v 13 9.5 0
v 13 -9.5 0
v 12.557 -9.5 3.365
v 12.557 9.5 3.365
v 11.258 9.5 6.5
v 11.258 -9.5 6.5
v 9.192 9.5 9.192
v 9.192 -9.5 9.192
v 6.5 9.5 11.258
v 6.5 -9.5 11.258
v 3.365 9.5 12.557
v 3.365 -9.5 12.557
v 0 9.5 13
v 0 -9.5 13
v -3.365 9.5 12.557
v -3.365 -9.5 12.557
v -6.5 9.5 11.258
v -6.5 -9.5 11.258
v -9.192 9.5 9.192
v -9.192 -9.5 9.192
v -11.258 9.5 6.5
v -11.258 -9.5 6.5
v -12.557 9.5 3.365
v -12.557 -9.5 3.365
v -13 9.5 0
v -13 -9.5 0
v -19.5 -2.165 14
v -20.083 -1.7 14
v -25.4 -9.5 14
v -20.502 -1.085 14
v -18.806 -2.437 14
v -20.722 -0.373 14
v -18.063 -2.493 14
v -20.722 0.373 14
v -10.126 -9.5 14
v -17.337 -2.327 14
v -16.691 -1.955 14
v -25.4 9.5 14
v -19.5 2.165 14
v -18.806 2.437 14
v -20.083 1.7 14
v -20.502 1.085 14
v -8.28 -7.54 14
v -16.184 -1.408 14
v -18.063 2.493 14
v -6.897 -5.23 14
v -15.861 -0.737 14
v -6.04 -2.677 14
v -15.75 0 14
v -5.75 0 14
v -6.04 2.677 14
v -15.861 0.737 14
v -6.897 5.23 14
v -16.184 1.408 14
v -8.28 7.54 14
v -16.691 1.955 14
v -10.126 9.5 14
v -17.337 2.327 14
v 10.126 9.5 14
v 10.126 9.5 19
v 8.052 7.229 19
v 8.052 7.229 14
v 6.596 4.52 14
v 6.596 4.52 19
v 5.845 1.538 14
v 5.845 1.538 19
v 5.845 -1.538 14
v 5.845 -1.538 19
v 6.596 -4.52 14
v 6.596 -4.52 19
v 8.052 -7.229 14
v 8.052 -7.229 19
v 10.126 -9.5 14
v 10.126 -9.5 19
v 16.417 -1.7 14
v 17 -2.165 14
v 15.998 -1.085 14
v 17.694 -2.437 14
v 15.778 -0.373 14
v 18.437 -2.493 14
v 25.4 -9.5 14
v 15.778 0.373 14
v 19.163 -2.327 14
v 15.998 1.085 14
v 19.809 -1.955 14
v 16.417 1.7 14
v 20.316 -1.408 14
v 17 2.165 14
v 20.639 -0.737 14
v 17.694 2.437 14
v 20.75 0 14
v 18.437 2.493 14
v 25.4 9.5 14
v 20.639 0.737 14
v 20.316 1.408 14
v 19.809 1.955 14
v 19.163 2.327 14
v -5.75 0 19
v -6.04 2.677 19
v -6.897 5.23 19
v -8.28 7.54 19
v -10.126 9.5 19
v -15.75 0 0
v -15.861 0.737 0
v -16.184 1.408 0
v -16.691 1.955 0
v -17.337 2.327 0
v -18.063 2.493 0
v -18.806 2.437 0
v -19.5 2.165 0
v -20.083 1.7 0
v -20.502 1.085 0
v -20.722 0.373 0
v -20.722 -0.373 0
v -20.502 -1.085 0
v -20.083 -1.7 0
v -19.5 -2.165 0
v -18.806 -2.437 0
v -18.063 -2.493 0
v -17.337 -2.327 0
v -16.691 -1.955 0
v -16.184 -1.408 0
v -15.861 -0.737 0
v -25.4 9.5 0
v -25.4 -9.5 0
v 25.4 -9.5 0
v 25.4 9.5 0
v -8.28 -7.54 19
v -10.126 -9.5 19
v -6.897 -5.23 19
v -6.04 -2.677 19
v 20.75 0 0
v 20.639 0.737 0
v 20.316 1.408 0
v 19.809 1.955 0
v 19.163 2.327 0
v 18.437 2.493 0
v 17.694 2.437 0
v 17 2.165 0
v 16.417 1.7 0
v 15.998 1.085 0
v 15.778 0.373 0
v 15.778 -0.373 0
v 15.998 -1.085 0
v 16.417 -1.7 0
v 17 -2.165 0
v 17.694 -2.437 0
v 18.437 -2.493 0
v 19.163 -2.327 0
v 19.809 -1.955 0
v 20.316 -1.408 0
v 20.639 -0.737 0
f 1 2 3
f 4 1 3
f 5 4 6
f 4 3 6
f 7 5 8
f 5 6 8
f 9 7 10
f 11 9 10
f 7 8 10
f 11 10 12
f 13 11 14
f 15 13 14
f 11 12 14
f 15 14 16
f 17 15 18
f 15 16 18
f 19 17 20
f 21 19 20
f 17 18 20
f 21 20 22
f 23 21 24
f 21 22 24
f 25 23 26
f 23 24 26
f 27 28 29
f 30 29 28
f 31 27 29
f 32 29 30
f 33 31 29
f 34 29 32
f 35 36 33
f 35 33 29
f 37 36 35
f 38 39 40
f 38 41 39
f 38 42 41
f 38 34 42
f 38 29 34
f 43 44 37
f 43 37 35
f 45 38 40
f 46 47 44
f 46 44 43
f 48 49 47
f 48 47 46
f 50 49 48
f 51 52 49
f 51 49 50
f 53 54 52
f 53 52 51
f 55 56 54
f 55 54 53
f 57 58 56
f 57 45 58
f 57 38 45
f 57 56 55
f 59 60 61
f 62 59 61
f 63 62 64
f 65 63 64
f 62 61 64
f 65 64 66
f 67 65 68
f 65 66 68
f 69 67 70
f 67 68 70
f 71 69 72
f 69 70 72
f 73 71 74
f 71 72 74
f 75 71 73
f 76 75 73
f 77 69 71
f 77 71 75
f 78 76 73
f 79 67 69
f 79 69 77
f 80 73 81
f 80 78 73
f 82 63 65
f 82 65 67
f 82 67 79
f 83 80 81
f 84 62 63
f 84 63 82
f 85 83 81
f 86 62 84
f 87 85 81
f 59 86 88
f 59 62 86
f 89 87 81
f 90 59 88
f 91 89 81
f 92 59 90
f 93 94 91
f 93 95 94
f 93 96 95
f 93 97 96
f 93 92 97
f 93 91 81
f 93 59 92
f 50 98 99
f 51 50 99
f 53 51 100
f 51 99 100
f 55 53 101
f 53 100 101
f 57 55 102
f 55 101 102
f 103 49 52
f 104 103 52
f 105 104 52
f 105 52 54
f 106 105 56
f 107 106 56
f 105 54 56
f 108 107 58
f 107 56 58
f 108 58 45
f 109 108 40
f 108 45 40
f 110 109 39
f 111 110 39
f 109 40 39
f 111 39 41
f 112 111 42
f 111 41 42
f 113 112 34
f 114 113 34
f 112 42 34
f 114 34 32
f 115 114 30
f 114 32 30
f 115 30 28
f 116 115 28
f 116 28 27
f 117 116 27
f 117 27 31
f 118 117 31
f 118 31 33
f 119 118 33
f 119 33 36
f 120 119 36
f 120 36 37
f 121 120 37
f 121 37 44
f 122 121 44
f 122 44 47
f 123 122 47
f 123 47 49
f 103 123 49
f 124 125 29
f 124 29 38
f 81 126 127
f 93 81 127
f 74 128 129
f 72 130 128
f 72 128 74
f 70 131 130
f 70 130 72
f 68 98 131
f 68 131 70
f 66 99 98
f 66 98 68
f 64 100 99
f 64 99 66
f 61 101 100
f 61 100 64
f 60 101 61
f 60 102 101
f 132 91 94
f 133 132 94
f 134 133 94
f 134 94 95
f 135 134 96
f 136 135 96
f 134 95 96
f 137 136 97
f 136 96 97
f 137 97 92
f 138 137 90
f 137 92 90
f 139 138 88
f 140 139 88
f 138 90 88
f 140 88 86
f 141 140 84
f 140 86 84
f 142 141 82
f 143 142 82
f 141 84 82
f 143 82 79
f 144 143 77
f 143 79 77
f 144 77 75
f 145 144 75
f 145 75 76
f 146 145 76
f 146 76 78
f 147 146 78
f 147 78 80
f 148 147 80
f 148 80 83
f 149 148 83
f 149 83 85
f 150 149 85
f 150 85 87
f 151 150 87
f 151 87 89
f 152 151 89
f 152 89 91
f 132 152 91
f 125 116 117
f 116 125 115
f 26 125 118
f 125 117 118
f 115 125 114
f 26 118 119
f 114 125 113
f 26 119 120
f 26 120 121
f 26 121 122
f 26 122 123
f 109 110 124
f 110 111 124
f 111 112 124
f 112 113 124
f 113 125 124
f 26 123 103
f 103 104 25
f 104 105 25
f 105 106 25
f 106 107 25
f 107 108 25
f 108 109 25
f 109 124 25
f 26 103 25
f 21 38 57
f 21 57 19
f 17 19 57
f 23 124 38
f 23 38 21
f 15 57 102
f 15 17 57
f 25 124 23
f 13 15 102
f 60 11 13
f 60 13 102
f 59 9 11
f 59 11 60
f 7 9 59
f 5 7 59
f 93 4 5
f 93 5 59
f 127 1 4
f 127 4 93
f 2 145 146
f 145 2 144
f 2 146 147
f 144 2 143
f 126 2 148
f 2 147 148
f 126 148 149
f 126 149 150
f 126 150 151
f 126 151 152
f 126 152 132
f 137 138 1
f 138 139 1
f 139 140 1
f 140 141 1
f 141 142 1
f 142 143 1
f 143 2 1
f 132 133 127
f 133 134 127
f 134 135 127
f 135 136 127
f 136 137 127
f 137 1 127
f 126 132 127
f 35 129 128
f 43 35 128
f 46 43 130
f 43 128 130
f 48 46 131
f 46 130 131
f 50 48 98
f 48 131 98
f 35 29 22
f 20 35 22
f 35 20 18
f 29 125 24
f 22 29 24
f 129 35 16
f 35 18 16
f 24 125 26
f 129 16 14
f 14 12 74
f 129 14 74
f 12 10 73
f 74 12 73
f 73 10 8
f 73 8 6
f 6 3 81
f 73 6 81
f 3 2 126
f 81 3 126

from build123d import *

# Parameters (mm, degrees)
SKETCH2_W               = 50.8
SKETCH2_H               = 19
BOSS_EXTRUDE1_DEPTH     = 19
SKETCH3_R               = 13
CUT_EXTRUDE1_DEPTH      = 20
SKETCH4_R               = 2.5
CUT_EXTRUDE2_DEPTH      = 5
SKETCH5_R               = 2.5
CUT_EXTRUDE3_DEPTH      = 1
CUT_EXTRUDE3_DEPTH_BACK = 20


with BuildPart() as part:
    # Sketch2 → Boss-Extrude1 (new body)
    with BuildSketch(Plane.XY):
        Rectangle(SKETCH2_W, SKETCH2_H)
    extrude(amount=BOSS_EXTRUDE1_DEPTH)

    # Sketch3 → Cut-Extrude1 (cut, through all)
    with BuildSketch(Plane.XZ.offset(9.5)):
        Circle(SKETCH3_R)
    extrude(amount=-CUT_EXTRUDE1_DEPTH, mode=Mode.SUBTRACT)

    # Sketch4 → Cut-Extrude2 (cut)
    with BuildSketch(Plane.XY.offset(19)):
        with BuildLine():
            ThreePointArc((-10.125961595, -9.5), (-6.896575846, -5.229699797), (-5.75, 0))
            ThreePointArc((-5.75, 0), (-6.896575846, 5.229699797), (-10.125961595, 9.5))
            Line((-10.125961595, 9.5), (-25.4, 9.5))
            Line((-25.4, 9.5), (-25.4, -9.5))
            Line((-25.4, -9.5), (-10.125961595, -9.5))
        make_face()
        with Locations((-18.25, 0)):
            Circle(SKETCH4_R, mode=Mode.SUBTRACT)
        with BuildLine():
            Line((25.4, 9.5), (10.125961595, 9.5))
            ThreePointArc((10.125961595, 9.5), (5.75, 0), (10.125961595, -9.5))
            Line((10.125961595, -9.5), (25.4, -9.5))
            Line((25.4, -9.5), (25.4, 9.5))
        make_face()
        with Locations((18.25, 0)):
            Circle(SKETCH4_R, mode=Mode.SUBTRACT)
    extrude(amount=-CUT_EXTRUDE2_DEPTH, mode=Mode.SUBTRACT)

    # Sketch5 → Cut-Extrude3 (cut, two sides)
    with BuildSketch(Plane.XY.offset(19)) as cut_extrude3_sk:
        with Locations((18.25, 0)):
            Circle(SKETCH5_R)
        with Locations((-18.25, 0)):
            Circle(SKETCH5_R)
    extrude(amount=CUT_EXTRUDE3_DEPTH, mode=Mode.SUBTRACT)
    extrude(cut_extrude3_sk.sketch, amount=-CUT_EXTRUDE3_DEPTH_BACK, mode=Mode.SUBTRACT)


solid = part.part
